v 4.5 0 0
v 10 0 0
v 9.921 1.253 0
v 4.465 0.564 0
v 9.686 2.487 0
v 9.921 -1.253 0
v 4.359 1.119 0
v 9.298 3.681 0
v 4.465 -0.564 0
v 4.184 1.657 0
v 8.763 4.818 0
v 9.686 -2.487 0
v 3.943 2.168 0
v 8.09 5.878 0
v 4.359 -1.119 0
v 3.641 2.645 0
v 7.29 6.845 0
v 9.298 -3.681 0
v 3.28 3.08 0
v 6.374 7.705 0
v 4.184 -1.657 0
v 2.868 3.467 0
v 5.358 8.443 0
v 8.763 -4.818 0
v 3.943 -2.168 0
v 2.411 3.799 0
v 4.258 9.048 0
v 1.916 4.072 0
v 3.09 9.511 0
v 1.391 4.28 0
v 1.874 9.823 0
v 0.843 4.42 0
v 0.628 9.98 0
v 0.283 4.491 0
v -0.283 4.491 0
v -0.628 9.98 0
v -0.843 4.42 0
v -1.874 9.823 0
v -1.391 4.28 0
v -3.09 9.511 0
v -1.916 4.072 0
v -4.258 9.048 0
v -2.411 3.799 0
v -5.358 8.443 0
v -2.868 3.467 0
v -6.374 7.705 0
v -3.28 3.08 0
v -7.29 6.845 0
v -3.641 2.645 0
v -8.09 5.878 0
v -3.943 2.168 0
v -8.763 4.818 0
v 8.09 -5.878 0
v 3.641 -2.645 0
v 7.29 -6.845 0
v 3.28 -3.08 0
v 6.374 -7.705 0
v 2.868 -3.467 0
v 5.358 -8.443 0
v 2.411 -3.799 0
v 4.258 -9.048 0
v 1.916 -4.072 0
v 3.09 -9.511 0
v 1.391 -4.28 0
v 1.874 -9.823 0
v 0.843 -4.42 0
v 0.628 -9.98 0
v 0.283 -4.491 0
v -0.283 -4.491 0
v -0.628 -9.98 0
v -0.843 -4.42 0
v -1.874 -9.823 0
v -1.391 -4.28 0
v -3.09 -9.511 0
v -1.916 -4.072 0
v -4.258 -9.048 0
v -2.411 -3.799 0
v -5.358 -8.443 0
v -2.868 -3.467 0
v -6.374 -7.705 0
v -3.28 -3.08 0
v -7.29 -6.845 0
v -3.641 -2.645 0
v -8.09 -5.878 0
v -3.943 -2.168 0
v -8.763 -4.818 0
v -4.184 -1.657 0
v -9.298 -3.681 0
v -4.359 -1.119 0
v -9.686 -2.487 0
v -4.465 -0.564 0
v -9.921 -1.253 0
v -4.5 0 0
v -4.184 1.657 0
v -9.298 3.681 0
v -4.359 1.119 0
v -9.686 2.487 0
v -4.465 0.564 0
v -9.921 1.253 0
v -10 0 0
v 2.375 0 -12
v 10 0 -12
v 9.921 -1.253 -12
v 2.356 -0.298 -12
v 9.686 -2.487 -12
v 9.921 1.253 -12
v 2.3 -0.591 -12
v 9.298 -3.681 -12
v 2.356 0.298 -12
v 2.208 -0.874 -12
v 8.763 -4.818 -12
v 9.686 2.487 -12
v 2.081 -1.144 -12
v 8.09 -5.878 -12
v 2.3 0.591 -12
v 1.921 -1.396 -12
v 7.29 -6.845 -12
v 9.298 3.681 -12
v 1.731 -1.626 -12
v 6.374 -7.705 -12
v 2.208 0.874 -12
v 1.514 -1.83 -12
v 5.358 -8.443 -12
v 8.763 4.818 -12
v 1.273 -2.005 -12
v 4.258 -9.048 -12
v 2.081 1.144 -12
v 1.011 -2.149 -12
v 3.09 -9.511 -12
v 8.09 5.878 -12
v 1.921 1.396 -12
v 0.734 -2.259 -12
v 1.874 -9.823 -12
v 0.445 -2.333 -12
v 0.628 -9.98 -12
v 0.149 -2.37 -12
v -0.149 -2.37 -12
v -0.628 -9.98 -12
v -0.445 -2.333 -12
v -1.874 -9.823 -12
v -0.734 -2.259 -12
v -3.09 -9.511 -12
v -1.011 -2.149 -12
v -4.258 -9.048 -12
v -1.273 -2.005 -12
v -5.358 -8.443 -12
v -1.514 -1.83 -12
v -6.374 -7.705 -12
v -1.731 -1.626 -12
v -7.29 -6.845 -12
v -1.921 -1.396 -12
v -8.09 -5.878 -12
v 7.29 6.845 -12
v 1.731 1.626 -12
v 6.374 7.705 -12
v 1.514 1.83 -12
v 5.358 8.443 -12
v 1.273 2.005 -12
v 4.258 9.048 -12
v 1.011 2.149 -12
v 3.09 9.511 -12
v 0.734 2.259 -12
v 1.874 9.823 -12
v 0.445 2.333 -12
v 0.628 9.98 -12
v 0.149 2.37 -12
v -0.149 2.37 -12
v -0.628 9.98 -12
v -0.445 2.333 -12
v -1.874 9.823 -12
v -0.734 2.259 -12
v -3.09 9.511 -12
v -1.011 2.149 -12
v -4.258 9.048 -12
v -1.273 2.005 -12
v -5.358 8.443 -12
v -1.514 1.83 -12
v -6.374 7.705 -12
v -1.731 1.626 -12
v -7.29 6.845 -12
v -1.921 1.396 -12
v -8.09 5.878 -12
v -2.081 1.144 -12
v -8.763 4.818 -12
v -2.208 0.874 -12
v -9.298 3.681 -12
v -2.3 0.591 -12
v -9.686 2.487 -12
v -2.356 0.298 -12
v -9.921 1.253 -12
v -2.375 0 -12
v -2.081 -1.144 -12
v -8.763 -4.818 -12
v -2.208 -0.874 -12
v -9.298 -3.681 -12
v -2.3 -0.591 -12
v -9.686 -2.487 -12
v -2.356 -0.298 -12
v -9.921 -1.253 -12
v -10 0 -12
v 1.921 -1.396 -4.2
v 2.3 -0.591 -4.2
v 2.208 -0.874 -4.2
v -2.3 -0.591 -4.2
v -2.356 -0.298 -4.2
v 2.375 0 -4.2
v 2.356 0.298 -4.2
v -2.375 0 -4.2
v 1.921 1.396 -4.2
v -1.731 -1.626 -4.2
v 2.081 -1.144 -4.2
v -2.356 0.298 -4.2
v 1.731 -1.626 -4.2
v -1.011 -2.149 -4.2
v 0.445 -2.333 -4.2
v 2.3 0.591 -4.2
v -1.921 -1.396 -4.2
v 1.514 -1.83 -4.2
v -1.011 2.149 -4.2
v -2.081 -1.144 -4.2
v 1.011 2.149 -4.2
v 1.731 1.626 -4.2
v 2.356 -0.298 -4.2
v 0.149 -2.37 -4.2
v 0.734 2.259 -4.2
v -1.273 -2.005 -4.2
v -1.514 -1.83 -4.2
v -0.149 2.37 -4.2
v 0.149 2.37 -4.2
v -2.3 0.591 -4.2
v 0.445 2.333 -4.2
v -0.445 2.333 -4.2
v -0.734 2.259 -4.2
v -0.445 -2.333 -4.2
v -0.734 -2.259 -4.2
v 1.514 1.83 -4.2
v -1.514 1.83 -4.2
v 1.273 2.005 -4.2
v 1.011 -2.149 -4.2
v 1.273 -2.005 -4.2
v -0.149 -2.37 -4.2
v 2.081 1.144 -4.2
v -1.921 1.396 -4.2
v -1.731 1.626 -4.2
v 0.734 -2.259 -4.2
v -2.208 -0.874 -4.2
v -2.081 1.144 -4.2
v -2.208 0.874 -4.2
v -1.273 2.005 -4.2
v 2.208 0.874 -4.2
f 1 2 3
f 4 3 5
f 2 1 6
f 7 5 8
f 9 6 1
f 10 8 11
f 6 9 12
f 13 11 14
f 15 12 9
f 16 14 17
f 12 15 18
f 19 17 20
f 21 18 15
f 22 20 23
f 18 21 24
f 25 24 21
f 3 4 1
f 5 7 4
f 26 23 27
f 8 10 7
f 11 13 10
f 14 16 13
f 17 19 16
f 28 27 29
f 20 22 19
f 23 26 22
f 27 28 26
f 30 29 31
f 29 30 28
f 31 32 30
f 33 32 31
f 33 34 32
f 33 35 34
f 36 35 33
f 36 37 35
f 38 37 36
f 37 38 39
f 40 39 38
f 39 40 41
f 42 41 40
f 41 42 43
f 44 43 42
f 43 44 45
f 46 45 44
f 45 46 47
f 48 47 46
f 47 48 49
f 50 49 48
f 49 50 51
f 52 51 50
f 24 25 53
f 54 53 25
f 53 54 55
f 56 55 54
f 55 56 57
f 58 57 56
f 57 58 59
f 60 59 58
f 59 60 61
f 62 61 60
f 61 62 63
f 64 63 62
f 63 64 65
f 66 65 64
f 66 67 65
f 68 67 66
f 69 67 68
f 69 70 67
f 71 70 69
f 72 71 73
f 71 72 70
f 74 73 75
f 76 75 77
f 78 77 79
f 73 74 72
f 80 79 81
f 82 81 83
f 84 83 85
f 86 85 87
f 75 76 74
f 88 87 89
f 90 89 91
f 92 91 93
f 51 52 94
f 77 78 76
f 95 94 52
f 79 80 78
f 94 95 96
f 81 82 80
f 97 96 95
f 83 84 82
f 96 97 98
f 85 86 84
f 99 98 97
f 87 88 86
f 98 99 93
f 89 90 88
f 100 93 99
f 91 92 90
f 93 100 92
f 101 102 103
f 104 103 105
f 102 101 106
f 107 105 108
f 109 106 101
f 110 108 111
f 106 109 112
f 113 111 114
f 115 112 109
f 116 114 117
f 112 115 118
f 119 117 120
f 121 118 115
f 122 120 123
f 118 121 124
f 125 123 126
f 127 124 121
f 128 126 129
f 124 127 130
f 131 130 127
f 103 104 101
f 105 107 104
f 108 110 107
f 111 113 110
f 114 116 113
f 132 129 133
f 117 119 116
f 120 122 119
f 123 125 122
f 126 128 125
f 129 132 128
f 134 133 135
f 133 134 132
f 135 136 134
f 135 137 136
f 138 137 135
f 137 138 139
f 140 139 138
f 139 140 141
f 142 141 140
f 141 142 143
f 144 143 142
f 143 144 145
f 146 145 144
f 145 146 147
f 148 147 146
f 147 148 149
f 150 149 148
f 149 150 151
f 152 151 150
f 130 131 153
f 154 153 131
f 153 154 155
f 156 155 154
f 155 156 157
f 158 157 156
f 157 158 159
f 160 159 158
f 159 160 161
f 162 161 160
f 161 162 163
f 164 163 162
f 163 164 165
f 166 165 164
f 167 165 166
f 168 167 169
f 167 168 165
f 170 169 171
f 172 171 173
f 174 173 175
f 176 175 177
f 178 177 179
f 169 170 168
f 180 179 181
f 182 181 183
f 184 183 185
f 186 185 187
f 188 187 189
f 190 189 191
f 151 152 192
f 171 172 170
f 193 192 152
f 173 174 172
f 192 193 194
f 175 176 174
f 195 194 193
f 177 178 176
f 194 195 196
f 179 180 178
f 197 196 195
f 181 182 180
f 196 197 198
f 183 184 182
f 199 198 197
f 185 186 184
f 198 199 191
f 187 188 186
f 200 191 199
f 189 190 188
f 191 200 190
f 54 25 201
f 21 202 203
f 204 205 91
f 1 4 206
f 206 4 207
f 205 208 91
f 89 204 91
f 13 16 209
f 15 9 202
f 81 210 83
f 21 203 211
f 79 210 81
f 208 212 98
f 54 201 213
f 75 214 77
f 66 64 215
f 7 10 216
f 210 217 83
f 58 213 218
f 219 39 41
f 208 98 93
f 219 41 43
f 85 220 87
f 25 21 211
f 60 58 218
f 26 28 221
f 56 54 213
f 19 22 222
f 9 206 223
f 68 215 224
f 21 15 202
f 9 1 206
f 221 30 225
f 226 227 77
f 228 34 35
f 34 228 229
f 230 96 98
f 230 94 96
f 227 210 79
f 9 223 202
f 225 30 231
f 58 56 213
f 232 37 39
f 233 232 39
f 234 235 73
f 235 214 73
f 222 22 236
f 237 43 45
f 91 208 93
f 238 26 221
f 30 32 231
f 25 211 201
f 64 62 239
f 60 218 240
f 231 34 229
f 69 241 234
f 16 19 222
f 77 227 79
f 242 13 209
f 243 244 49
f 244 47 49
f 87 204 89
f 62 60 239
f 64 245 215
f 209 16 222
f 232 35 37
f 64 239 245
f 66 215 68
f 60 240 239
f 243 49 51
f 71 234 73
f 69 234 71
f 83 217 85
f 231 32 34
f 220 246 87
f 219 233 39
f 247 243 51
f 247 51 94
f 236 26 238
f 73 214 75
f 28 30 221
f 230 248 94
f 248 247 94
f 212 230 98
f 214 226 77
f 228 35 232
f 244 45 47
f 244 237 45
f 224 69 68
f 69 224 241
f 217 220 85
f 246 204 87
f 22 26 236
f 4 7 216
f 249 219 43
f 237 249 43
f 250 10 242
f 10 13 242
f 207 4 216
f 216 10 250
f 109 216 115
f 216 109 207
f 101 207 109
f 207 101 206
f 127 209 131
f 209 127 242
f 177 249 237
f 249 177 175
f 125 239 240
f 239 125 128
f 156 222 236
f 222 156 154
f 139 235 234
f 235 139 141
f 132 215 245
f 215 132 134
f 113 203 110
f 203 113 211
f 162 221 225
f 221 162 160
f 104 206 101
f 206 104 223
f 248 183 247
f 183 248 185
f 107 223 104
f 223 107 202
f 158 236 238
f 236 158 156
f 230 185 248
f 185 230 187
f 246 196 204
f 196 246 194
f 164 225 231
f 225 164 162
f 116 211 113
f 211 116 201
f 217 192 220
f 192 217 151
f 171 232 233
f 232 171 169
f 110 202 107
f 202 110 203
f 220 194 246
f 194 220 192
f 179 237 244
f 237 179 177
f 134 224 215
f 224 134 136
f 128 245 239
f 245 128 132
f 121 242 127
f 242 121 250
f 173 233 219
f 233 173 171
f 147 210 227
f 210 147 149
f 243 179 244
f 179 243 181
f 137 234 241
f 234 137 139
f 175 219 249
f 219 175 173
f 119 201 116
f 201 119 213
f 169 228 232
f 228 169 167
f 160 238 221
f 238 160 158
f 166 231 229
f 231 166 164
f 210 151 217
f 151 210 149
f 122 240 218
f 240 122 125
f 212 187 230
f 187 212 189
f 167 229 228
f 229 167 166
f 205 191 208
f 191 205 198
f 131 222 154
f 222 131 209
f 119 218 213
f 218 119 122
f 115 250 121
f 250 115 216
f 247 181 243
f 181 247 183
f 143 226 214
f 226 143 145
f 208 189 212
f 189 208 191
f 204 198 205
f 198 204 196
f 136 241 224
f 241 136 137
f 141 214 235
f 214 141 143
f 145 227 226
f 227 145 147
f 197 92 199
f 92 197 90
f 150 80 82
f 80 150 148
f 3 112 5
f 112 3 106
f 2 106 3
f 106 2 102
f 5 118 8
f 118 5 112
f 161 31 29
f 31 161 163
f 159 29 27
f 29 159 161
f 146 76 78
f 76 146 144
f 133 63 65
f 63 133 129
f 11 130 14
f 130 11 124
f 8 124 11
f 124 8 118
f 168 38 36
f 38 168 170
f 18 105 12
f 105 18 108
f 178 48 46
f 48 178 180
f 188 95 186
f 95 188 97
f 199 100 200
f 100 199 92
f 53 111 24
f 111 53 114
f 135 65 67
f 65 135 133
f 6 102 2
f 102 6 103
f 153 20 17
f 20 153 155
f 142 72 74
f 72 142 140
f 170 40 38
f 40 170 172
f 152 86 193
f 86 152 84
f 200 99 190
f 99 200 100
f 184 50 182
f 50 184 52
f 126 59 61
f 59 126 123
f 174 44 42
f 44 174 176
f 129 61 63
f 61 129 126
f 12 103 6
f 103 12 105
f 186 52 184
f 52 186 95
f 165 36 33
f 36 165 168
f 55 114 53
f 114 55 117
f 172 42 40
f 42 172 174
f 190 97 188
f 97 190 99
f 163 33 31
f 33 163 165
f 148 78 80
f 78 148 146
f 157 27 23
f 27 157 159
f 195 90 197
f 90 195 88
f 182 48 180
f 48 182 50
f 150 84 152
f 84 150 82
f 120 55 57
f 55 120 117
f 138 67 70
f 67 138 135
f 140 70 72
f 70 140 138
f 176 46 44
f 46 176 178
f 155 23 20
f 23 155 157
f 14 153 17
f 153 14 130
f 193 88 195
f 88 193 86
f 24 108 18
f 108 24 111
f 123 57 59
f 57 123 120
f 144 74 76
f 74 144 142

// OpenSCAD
$fn = 50;


difference() {
	union() {
		translate(v = [0, 0, -12.0000000000]) {
			cylinder(h = 12, r = 10.0000000000);
		}
		cylinder(h = 0, r = 13.0000000000);
	}
	union() {
		translate(v = [0, 0, 0]) {
			rotate(a = [0, 0, 0]) {
				difference() {
					union() {
						#translate(v = [0, 0, -12.0000000000]) {
							cylinder(h = 12, r = 2.2500000000);
						}
						#translate(v = [0, 0, -4.2000000000]) {
							cylinder(h = 4.2000000000, r = 10.0000000000, r1 = 2.3750000000, r2 = 4.5000000000);
						}
						#translate(v = [0, 0, -12.0000000000]) {
							cylinder(h = 12, r = 2.3750000000);
						}
						#translate(v = [0, 0, -12.0000000000]) {
							cylinder(h = 12, r = 2.2500000000);
						}
					}
					union();
				}
			}
		}
	}
}
